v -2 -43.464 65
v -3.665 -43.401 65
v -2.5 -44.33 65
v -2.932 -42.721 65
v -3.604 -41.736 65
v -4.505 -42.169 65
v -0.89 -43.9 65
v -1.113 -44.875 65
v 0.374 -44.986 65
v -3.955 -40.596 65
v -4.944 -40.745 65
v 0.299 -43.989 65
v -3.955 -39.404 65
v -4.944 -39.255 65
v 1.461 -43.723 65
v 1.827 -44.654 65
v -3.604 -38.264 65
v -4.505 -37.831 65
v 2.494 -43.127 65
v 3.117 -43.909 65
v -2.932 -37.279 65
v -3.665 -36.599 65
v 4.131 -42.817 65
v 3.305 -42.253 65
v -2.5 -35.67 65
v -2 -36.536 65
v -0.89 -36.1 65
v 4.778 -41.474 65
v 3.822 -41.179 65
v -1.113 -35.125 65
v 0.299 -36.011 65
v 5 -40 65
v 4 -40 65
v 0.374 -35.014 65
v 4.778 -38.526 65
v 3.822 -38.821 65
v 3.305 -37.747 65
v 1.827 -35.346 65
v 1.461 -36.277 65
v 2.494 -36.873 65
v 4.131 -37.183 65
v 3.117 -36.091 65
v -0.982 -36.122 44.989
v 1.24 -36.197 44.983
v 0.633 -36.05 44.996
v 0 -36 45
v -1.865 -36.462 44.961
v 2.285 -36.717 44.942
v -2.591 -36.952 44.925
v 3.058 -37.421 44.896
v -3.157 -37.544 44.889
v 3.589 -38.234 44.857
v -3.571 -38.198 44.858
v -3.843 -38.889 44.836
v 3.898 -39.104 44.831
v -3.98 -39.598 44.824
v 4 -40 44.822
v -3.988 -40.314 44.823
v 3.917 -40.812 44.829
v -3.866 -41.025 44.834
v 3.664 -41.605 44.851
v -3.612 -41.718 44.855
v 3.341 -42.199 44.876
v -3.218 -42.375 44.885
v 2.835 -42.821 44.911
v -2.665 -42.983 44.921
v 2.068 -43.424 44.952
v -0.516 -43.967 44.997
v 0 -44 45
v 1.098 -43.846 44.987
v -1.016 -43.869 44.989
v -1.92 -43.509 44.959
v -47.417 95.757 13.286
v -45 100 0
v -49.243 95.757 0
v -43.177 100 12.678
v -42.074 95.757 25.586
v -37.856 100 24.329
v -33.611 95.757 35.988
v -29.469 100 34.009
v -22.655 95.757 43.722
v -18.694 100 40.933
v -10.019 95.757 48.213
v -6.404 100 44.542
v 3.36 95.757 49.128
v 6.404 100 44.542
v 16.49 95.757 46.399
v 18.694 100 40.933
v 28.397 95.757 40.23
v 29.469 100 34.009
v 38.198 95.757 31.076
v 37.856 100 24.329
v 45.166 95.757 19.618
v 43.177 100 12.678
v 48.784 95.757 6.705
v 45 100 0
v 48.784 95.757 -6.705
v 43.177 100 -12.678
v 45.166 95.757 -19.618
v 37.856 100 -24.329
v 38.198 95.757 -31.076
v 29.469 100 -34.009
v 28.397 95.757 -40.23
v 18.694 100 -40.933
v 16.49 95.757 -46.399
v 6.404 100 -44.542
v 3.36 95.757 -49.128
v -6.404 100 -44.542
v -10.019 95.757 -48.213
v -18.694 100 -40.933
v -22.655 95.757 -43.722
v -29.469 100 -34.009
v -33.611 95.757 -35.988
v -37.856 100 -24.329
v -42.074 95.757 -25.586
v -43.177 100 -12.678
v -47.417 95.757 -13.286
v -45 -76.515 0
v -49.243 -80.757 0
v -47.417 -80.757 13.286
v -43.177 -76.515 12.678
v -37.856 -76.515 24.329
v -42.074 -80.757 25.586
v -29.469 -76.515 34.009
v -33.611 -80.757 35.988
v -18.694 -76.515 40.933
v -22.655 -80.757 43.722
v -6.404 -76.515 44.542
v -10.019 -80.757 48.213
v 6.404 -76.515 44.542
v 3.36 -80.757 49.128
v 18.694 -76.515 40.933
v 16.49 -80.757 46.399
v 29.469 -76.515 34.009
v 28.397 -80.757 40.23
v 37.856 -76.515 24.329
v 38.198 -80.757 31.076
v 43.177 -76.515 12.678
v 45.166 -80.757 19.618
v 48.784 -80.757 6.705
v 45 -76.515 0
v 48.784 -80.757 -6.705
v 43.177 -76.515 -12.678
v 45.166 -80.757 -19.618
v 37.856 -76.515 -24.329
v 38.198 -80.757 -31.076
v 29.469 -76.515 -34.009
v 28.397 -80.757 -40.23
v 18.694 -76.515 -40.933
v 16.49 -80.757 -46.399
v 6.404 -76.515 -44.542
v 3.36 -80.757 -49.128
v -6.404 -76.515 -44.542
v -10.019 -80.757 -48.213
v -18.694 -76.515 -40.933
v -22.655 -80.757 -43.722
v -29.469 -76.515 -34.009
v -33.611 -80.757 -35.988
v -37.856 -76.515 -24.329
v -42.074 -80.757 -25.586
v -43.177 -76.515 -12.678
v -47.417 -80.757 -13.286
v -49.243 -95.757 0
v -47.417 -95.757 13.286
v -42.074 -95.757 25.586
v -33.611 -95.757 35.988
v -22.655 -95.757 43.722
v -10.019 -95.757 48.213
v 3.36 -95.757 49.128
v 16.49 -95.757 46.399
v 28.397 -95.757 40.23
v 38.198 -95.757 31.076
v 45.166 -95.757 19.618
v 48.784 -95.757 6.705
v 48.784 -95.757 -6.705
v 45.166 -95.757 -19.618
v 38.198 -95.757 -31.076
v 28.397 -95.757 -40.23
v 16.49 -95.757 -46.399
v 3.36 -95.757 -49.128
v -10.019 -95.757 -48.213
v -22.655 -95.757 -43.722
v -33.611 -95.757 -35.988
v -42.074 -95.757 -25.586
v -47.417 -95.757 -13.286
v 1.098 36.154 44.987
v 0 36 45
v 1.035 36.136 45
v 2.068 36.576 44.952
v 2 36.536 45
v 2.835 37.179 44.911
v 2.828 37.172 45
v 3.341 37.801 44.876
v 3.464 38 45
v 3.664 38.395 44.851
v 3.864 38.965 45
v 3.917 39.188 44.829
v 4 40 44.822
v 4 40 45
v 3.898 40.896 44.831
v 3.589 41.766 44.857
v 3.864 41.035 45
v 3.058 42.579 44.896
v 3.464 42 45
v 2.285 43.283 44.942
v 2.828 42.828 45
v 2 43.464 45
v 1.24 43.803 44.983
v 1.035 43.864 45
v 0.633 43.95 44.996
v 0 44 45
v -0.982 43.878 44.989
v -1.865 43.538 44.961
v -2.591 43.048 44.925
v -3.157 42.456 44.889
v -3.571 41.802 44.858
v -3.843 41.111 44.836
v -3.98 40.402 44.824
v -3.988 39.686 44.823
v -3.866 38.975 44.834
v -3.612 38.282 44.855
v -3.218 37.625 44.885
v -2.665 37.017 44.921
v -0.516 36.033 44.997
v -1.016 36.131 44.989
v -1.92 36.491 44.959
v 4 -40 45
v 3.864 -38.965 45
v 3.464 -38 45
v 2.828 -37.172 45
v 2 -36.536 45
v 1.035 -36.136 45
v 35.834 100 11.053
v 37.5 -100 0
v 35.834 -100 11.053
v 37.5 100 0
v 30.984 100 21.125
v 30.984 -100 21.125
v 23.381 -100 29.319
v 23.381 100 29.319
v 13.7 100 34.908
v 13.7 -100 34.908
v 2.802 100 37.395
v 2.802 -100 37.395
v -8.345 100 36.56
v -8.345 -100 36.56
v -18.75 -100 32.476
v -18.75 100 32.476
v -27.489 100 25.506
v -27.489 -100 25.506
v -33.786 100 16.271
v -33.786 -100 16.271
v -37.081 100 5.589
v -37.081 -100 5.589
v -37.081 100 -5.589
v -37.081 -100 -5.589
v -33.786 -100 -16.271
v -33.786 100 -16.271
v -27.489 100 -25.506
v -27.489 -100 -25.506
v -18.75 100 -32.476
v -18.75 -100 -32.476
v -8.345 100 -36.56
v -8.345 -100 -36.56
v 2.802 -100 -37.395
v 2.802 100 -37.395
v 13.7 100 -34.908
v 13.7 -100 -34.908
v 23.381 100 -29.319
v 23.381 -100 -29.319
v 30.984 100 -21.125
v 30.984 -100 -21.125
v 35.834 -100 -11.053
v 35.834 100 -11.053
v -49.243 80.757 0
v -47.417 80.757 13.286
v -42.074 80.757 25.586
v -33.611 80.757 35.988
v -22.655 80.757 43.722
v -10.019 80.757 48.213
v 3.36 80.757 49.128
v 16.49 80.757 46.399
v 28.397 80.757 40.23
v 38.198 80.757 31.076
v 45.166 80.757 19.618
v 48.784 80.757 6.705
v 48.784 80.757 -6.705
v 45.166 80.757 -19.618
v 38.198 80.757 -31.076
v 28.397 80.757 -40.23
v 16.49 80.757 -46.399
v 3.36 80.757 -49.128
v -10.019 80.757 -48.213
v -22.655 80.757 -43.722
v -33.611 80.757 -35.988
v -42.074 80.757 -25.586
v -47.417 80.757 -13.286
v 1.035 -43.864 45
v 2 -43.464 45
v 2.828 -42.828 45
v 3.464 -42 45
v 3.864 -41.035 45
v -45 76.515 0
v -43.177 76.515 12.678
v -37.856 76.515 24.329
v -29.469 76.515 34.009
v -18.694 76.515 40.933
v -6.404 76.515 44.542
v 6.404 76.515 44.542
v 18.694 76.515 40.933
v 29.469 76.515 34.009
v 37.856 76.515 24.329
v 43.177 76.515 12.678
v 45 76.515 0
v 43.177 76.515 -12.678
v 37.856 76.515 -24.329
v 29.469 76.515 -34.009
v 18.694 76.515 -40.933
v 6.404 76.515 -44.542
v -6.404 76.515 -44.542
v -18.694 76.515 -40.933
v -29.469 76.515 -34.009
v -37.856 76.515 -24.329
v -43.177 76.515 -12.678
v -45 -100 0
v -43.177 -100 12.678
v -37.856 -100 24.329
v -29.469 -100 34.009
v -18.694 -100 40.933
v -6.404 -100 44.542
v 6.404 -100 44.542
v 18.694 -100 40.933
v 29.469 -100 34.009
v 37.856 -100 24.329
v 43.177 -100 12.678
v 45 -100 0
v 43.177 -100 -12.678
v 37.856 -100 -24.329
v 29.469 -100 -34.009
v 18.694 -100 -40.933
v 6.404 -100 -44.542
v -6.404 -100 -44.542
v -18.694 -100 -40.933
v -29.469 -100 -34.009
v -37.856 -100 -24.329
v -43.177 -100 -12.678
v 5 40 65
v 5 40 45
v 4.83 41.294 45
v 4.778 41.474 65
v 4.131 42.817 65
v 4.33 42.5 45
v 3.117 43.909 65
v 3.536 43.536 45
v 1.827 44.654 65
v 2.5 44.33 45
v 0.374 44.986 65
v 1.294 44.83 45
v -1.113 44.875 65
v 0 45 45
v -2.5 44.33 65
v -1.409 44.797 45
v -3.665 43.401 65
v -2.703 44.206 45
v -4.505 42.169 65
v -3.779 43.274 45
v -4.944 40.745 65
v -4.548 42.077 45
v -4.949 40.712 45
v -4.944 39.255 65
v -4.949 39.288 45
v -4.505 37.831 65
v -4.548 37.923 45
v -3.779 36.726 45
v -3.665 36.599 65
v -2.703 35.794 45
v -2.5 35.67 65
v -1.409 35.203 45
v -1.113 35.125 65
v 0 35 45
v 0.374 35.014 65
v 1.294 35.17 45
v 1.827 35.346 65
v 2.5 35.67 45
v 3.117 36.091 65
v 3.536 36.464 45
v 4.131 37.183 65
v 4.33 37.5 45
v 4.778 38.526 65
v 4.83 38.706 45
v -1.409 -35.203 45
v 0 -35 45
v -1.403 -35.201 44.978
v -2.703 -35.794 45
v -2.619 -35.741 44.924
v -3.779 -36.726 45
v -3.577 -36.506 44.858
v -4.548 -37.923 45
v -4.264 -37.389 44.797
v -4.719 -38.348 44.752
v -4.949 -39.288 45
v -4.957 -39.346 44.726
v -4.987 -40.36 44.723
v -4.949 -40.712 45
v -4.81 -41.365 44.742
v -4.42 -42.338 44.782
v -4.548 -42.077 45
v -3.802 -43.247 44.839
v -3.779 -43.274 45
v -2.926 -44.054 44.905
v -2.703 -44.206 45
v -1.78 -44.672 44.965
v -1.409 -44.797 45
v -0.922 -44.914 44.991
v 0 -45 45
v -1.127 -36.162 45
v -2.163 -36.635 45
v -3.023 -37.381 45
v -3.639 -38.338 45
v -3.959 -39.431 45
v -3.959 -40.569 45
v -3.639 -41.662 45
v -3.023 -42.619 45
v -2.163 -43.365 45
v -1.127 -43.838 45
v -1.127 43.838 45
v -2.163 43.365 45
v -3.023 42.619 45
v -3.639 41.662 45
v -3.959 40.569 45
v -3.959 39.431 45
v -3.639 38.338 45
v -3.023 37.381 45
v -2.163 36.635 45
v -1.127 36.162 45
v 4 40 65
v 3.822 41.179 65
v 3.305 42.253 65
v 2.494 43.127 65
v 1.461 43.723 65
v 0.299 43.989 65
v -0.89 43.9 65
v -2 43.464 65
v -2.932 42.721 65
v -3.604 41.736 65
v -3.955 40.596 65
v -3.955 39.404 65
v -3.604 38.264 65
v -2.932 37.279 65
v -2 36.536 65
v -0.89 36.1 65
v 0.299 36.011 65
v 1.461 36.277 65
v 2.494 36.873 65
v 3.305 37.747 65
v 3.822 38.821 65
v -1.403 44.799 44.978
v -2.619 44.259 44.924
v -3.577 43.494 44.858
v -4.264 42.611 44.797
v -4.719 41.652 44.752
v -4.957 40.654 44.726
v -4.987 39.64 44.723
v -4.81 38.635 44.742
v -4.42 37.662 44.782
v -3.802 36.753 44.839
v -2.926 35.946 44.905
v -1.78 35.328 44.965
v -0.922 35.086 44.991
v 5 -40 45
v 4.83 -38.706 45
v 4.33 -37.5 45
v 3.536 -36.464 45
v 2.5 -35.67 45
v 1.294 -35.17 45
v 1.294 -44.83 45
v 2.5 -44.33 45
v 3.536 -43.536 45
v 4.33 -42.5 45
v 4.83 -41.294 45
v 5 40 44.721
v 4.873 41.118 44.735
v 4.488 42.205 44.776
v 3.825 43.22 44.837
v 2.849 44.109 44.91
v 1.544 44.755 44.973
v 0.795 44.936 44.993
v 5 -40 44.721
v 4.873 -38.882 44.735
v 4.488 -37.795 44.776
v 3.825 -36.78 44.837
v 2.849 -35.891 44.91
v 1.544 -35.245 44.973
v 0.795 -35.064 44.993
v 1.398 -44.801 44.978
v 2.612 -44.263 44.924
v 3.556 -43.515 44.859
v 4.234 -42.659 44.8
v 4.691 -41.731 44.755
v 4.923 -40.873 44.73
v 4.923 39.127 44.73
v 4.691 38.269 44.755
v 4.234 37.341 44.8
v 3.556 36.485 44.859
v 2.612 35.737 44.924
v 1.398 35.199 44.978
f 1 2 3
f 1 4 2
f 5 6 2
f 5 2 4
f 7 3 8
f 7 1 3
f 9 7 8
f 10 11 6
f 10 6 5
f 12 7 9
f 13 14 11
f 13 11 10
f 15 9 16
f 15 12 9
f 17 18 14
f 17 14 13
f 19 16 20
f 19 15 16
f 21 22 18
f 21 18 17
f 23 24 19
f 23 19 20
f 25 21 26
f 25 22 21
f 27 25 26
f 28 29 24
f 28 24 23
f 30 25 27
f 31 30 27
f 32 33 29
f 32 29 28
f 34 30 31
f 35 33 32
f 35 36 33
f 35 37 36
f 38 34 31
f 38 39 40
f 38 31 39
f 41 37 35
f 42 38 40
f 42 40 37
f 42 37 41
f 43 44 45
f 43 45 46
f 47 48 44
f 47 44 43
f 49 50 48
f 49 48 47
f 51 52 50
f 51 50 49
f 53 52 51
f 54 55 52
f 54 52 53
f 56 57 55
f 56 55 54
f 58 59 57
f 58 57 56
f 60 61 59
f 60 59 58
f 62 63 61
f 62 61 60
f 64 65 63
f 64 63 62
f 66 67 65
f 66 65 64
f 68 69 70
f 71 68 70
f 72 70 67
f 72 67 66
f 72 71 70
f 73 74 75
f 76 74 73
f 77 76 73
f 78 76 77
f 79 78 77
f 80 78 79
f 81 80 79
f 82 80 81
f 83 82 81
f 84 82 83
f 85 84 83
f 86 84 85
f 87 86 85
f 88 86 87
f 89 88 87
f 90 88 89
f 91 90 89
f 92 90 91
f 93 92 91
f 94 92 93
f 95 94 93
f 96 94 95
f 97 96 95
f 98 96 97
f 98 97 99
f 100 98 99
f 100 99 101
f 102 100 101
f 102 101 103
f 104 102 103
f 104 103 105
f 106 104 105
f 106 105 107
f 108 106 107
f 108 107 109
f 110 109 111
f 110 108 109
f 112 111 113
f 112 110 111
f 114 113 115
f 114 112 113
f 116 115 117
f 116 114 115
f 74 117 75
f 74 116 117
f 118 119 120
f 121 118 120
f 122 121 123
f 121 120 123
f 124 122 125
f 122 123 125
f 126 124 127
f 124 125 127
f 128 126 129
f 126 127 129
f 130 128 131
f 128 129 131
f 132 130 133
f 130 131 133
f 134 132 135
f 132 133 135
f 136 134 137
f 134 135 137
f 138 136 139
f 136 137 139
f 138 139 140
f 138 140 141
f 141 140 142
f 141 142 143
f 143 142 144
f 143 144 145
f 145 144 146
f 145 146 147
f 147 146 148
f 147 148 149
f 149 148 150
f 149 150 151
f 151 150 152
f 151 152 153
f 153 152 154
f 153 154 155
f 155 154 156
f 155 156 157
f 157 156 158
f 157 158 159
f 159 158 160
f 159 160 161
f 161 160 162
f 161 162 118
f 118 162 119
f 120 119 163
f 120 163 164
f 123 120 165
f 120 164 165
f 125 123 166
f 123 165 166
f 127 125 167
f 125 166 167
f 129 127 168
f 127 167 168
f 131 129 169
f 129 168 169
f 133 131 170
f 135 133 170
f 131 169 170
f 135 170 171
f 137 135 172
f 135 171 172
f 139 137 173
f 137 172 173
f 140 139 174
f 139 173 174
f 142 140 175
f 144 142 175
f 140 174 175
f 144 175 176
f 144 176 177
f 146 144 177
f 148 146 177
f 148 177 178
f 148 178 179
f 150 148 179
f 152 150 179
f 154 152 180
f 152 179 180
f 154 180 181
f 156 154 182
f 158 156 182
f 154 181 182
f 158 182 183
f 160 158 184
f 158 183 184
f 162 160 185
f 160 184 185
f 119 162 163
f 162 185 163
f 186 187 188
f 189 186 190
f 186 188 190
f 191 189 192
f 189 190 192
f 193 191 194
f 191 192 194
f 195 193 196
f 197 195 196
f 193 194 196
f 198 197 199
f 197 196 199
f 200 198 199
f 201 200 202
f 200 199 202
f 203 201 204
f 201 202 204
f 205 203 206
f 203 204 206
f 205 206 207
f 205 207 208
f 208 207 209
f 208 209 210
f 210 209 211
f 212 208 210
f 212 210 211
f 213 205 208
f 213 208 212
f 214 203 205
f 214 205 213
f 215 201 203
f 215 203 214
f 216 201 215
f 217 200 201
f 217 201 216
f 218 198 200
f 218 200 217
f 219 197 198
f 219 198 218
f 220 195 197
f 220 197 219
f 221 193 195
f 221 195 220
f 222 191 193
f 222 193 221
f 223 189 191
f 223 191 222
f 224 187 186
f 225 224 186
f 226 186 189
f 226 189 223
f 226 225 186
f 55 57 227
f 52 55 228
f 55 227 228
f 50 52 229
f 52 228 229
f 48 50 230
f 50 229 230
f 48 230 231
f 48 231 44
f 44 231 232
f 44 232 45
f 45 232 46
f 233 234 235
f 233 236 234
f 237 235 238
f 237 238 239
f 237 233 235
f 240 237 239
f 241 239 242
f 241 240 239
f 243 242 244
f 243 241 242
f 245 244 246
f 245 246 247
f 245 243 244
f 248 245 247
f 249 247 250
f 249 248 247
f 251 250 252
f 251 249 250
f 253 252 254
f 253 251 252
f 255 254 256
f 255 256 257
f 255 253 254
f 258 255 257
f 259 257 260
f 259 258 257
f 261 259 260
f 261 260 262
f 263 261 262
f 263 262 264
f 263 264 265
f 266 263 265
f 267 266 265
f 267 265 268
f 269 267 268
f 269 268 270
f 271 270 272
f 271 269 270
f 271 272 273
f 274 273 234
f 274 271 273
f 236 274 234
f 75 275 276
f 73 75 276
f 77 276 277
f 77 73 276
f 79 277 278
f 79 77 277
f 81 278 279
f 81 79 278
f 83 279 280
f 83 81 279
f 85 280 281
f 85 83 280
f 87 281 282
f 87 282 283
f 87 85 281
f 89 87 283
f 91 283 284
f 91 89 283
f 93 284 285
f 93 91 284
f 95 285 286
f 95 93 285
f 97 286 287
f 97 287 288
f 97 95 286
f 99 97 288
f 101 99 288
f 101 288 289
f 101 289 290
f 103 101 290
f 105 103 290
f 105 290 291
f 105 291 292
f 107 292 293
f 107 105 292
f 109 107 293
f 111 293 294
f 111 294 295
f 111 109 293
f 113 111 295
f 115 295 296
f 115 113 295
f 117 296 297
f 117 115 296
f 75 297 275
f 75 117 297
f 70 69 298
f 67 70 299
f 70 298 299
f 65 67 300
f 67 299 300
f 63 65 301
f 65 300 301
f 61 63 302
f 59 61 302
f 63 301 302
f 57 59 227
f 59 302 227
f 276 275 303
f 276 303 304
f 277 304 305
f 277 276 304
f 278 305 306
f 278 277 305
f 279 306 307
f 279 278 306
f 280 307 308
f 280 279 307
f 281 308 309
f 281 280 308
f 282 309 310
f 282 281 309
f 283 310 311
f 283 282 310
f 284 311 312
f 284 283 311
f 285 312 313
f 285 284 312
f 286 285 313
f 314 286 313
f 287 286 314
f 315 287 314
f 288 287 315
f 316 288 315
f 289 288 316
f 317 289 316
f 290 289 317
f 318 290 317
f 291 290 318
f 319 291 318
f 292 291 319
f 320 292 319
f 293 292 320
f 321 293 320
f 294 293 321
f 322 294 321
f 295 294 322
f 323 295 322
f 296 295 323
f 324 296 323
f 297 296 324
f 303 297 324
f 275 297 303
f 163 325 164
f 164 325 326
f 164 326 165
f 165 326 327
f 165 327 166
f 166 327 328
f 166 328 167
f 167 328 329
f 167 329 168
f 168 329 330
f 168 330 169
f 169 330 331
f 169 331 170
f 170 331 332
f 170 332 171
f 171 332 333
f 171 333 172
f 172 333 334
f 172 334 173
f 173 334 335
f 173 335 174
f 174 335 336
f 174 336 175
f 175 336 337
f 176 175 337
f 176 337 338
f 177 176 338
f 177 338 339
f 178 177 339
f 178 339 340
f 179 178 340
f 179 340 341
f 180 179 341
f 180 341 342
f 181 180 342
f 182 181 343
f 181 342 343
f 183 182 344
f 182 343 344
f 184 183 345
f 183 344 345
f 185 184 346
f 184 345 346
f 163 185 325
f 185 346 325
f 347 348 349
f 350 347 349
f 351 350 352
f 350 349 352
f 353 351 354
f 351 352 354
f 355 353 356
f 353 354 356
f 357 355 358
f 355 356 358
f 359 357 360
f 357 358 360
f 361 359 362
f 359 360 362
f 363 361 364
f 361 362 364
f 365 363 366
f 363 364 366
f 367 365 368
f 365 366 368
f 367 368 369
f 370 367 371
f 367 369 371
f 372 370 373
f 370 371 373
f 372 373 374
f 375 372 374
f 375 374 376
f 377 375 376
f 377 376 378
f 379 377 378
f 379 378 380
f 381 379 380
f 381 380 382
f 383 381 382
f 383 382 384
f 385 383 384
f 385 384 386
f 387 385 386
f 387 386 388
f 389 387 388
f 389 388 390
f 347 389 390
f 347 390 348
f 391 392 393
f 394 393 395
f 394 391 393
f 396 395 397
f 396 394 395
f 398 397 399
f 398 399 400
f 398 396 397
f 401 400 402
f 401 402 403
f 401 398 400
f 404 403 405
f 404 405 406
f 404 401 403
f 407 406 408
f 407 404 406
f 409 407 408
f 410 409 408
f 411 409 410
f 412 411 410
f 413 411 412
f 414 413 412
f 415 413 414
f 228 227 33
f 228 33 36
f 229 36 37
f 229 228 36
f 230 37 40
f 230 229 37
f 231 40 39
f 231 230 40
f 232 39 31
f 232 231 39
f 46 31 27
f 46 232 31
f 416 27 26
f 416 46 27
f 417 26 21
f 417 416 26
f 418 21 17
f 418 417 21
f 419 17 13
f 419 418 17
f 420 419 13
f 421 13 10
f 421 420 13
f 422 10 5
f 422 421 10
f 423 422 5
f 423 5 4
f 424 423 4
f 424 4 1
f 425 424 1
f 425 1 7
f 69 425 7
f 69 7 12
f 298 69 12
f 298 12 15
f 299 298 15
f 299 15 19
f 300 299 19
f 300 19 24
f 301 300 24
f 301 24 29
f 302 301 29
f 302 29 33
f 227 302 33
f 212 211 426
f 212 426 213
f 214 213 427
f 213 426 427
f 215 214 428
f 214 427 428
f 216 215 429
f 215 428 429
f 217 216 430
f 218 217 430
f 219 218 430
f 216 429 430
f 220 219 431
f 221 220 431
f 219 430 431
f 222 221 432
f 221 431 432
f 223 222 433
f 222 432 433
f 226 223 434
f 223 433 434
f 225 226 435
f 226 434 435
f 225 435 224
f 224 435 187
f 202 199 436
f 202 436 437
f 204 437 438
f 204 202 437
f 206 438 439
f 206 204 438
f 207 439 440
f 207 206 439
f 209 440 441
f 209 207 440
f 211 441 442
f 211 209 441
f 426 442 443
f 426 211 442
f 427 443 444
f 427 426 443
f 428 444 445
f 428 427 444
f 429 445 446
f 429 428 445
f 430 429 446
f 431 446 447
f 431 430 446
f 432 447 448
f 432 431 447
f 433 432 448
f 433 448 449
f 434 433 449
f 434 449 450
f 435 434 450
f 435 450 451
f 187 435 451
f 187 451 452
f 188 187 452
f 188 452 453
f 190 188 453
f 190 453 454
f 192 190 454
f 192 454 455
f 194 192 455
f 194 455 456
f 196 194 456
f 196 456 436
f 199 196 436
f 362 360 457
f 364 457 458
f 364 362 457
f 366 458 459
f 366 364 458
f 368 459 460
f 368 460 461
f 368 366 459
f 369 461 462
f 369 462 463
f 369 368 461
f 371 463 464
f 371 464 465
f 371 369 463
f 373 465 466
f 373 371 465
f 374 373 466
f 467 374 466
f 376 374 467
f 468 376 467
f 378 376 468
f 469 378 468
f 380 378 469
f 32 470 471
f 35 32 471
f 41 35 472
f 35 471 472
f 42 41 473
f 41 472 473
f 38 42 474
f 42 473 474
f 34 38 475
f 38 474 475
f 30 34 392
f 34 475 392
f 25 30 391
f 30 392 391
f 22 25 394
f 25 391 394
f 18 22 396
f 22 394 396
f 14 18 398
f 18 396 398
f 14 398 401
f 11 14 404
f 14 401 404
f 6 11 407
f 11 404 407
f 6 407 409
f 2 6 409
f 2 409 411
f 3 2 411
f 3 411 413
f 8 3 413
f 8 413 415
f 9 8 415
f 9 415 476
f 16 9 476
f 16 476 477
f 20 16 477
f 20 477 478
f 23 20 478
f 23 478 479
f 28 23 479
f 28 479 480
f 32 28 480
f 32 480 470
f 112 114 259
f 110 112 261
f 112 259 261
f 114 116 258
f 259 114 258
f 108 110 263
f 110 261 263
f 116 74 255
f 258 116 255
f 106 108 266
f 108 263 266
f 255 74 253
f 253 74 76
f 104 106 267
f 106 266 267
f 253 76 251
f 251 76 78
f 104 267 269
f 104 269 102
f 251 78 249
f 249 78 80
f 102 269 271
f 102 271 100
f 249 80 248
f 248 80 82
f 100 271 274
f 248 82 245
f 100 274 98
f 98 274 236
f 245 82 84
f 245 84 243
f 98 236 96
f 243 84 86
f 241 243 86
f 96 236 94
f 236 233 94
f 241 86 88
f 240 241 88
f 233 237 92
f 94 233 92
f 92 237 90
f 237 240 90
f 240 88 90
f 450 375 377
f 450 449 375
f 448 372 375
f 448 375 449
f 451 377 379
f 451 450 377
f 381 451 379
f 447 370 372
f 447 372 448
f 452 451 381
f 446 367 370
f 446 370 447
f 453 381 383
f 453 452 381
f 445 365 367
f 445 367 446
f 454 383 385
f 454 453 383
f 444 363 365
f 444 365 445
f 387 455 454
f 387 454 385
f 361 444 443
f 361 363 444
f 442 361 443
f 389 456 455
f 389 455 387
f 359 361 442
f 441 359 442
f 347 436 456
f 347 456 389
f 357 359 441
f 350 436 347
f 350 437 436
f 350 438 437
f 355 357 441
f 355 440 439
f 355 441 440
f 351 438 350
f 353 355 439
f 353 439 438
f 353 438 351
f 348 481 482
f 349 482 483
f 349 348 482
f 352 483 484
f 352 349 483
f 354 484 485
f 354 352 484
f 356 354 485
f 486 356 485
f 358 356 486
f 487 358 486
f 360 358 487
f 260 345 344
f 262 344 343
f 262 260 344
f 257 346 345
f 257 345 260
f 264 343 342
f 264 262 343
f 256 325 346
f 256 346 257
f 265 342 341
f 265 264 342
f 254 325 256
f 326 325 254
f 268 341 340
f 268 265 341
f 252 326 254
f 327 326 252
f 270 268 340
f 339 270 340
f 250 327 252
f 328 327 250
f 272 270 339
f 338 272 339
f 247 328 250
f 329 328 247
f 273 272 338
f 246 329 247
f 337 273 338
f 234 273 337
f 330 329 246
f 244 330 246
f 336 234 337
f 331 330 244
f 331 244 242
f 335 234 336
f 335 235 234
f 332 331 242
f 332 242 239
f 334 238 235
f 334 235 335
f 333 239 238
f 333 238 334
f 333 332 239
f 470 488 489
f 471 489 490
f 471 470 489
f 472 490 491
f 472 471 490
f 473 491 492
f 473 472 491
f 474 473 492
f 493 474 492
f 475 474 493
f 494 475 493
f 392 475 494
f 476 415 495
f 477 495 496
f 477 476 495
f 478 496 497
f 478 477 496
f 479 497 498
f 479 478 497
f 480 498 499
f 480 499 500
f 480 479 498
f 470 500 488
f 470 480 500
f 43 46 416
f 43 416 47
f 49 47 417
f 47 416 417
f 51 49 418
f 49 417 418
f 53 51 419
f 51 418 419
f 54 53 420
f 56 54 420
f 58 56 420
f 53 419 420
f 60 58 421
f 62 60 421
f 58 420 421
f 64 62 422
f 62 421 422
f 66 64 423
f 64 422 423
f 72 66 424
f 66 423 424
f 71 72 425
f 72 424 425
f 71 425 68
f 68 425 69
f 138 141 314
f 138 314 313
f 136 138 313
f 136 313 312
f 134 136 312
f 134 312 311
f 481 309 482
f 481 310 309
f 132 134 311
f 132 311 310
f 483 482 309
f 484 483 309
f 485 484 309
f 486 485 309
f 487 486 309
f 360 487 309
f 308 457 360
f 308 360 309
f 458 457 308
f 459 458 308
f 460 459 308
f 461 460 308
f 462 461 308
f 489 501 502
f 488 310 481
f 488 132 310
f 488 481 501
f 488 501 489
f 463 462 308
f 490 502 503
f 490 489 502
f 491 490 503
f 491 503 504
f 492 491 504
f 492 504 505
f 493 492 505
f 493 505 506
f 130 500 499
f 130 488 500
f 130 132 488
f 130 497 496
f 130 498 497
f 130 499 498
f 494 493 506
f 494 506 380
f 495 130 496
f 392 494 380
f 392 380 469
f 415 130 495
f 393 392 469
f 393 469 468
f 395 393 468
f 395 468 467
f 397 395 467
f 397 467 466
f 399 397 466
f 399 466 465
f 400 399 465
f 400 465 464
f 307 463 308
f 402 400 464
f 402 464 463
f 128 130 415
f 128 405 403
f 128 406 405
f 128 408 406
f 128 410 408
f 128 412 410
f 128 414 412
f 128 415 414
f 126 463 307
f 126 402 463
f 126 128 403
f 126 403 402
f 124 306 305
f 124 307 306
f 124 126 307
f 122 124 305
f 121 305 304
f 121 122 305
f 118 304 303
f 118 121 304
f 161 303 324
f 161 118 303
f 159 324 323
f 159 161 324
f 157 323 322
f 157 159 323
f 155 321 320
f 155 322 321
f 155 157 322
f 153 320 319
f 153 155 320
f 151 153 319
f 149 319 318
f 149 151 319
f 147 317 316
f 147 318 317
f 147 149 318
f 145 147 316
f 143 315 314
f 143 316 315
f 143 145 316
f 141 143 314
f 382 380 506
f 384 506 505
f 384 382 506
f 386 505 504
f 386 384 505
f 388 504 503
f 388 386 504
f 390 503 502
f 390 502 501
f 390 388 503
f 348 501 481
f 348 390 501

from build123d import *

# Parameters (mm, degrees)
F0_R          = 45
F0_R_2        = 37.5
F1_DEPTH      = 100
F3_R          = 5
F3_R_2        = 4
F4_DEPTH      = 20
F4_DEPTH_BACK = 5


# Not quite as in the source:
# - a pattern or mirror of a feature is missing from the dataset's text; its kind, count and spacing are read off the source's solid


with BuildPart() as f1:
    # F0 (on Front) → F1 (new body, symmetric)
    with BuildSketch(Plane.XZ):
        Circle(F0_R)
        Circle(F0_R_2, mode=Mode.SUBTRACT)
    extrude(amount=F1_DEPTH, both=True)

    # F3 (on offset) → F4 (join, two sides)
    with BuildSketch(Plane.XY.offset(45)) as f4_sk:
        with Locations((0, 40)):
            Circle(F3_R)
        with Locations((0, 40)):
            Circle(F3_R_2, mode=Mode.SUBTRACT)
        with Locations((0, -40)):
            Circle(F3_R)
        with Locations((0, -40)):
            Circle(F3_R_2, mode=Mode.SUBTRACT)
    extrude(amount=F4_DEPTH)
    extrude(f4_sk.sketch, amount=-F4_DEPTH_BACK)

    # F5 (on Top) → F6 (revolve)
    with BuildSketch(Plane.XY):
        Polygon((-49.2426406871, -95.7573593129), (-45, -100), (-45, -76.5147186258), (-49.2426406871, -80.7573593129), align=None)
    f6 = revolve(axis=Axis((0, 11.0722705722, 0), (0, 1, 0)))

    # F6_copies: F6 across plane
    add(f6.mirror(Plane.ZX))


solid = f1.part
